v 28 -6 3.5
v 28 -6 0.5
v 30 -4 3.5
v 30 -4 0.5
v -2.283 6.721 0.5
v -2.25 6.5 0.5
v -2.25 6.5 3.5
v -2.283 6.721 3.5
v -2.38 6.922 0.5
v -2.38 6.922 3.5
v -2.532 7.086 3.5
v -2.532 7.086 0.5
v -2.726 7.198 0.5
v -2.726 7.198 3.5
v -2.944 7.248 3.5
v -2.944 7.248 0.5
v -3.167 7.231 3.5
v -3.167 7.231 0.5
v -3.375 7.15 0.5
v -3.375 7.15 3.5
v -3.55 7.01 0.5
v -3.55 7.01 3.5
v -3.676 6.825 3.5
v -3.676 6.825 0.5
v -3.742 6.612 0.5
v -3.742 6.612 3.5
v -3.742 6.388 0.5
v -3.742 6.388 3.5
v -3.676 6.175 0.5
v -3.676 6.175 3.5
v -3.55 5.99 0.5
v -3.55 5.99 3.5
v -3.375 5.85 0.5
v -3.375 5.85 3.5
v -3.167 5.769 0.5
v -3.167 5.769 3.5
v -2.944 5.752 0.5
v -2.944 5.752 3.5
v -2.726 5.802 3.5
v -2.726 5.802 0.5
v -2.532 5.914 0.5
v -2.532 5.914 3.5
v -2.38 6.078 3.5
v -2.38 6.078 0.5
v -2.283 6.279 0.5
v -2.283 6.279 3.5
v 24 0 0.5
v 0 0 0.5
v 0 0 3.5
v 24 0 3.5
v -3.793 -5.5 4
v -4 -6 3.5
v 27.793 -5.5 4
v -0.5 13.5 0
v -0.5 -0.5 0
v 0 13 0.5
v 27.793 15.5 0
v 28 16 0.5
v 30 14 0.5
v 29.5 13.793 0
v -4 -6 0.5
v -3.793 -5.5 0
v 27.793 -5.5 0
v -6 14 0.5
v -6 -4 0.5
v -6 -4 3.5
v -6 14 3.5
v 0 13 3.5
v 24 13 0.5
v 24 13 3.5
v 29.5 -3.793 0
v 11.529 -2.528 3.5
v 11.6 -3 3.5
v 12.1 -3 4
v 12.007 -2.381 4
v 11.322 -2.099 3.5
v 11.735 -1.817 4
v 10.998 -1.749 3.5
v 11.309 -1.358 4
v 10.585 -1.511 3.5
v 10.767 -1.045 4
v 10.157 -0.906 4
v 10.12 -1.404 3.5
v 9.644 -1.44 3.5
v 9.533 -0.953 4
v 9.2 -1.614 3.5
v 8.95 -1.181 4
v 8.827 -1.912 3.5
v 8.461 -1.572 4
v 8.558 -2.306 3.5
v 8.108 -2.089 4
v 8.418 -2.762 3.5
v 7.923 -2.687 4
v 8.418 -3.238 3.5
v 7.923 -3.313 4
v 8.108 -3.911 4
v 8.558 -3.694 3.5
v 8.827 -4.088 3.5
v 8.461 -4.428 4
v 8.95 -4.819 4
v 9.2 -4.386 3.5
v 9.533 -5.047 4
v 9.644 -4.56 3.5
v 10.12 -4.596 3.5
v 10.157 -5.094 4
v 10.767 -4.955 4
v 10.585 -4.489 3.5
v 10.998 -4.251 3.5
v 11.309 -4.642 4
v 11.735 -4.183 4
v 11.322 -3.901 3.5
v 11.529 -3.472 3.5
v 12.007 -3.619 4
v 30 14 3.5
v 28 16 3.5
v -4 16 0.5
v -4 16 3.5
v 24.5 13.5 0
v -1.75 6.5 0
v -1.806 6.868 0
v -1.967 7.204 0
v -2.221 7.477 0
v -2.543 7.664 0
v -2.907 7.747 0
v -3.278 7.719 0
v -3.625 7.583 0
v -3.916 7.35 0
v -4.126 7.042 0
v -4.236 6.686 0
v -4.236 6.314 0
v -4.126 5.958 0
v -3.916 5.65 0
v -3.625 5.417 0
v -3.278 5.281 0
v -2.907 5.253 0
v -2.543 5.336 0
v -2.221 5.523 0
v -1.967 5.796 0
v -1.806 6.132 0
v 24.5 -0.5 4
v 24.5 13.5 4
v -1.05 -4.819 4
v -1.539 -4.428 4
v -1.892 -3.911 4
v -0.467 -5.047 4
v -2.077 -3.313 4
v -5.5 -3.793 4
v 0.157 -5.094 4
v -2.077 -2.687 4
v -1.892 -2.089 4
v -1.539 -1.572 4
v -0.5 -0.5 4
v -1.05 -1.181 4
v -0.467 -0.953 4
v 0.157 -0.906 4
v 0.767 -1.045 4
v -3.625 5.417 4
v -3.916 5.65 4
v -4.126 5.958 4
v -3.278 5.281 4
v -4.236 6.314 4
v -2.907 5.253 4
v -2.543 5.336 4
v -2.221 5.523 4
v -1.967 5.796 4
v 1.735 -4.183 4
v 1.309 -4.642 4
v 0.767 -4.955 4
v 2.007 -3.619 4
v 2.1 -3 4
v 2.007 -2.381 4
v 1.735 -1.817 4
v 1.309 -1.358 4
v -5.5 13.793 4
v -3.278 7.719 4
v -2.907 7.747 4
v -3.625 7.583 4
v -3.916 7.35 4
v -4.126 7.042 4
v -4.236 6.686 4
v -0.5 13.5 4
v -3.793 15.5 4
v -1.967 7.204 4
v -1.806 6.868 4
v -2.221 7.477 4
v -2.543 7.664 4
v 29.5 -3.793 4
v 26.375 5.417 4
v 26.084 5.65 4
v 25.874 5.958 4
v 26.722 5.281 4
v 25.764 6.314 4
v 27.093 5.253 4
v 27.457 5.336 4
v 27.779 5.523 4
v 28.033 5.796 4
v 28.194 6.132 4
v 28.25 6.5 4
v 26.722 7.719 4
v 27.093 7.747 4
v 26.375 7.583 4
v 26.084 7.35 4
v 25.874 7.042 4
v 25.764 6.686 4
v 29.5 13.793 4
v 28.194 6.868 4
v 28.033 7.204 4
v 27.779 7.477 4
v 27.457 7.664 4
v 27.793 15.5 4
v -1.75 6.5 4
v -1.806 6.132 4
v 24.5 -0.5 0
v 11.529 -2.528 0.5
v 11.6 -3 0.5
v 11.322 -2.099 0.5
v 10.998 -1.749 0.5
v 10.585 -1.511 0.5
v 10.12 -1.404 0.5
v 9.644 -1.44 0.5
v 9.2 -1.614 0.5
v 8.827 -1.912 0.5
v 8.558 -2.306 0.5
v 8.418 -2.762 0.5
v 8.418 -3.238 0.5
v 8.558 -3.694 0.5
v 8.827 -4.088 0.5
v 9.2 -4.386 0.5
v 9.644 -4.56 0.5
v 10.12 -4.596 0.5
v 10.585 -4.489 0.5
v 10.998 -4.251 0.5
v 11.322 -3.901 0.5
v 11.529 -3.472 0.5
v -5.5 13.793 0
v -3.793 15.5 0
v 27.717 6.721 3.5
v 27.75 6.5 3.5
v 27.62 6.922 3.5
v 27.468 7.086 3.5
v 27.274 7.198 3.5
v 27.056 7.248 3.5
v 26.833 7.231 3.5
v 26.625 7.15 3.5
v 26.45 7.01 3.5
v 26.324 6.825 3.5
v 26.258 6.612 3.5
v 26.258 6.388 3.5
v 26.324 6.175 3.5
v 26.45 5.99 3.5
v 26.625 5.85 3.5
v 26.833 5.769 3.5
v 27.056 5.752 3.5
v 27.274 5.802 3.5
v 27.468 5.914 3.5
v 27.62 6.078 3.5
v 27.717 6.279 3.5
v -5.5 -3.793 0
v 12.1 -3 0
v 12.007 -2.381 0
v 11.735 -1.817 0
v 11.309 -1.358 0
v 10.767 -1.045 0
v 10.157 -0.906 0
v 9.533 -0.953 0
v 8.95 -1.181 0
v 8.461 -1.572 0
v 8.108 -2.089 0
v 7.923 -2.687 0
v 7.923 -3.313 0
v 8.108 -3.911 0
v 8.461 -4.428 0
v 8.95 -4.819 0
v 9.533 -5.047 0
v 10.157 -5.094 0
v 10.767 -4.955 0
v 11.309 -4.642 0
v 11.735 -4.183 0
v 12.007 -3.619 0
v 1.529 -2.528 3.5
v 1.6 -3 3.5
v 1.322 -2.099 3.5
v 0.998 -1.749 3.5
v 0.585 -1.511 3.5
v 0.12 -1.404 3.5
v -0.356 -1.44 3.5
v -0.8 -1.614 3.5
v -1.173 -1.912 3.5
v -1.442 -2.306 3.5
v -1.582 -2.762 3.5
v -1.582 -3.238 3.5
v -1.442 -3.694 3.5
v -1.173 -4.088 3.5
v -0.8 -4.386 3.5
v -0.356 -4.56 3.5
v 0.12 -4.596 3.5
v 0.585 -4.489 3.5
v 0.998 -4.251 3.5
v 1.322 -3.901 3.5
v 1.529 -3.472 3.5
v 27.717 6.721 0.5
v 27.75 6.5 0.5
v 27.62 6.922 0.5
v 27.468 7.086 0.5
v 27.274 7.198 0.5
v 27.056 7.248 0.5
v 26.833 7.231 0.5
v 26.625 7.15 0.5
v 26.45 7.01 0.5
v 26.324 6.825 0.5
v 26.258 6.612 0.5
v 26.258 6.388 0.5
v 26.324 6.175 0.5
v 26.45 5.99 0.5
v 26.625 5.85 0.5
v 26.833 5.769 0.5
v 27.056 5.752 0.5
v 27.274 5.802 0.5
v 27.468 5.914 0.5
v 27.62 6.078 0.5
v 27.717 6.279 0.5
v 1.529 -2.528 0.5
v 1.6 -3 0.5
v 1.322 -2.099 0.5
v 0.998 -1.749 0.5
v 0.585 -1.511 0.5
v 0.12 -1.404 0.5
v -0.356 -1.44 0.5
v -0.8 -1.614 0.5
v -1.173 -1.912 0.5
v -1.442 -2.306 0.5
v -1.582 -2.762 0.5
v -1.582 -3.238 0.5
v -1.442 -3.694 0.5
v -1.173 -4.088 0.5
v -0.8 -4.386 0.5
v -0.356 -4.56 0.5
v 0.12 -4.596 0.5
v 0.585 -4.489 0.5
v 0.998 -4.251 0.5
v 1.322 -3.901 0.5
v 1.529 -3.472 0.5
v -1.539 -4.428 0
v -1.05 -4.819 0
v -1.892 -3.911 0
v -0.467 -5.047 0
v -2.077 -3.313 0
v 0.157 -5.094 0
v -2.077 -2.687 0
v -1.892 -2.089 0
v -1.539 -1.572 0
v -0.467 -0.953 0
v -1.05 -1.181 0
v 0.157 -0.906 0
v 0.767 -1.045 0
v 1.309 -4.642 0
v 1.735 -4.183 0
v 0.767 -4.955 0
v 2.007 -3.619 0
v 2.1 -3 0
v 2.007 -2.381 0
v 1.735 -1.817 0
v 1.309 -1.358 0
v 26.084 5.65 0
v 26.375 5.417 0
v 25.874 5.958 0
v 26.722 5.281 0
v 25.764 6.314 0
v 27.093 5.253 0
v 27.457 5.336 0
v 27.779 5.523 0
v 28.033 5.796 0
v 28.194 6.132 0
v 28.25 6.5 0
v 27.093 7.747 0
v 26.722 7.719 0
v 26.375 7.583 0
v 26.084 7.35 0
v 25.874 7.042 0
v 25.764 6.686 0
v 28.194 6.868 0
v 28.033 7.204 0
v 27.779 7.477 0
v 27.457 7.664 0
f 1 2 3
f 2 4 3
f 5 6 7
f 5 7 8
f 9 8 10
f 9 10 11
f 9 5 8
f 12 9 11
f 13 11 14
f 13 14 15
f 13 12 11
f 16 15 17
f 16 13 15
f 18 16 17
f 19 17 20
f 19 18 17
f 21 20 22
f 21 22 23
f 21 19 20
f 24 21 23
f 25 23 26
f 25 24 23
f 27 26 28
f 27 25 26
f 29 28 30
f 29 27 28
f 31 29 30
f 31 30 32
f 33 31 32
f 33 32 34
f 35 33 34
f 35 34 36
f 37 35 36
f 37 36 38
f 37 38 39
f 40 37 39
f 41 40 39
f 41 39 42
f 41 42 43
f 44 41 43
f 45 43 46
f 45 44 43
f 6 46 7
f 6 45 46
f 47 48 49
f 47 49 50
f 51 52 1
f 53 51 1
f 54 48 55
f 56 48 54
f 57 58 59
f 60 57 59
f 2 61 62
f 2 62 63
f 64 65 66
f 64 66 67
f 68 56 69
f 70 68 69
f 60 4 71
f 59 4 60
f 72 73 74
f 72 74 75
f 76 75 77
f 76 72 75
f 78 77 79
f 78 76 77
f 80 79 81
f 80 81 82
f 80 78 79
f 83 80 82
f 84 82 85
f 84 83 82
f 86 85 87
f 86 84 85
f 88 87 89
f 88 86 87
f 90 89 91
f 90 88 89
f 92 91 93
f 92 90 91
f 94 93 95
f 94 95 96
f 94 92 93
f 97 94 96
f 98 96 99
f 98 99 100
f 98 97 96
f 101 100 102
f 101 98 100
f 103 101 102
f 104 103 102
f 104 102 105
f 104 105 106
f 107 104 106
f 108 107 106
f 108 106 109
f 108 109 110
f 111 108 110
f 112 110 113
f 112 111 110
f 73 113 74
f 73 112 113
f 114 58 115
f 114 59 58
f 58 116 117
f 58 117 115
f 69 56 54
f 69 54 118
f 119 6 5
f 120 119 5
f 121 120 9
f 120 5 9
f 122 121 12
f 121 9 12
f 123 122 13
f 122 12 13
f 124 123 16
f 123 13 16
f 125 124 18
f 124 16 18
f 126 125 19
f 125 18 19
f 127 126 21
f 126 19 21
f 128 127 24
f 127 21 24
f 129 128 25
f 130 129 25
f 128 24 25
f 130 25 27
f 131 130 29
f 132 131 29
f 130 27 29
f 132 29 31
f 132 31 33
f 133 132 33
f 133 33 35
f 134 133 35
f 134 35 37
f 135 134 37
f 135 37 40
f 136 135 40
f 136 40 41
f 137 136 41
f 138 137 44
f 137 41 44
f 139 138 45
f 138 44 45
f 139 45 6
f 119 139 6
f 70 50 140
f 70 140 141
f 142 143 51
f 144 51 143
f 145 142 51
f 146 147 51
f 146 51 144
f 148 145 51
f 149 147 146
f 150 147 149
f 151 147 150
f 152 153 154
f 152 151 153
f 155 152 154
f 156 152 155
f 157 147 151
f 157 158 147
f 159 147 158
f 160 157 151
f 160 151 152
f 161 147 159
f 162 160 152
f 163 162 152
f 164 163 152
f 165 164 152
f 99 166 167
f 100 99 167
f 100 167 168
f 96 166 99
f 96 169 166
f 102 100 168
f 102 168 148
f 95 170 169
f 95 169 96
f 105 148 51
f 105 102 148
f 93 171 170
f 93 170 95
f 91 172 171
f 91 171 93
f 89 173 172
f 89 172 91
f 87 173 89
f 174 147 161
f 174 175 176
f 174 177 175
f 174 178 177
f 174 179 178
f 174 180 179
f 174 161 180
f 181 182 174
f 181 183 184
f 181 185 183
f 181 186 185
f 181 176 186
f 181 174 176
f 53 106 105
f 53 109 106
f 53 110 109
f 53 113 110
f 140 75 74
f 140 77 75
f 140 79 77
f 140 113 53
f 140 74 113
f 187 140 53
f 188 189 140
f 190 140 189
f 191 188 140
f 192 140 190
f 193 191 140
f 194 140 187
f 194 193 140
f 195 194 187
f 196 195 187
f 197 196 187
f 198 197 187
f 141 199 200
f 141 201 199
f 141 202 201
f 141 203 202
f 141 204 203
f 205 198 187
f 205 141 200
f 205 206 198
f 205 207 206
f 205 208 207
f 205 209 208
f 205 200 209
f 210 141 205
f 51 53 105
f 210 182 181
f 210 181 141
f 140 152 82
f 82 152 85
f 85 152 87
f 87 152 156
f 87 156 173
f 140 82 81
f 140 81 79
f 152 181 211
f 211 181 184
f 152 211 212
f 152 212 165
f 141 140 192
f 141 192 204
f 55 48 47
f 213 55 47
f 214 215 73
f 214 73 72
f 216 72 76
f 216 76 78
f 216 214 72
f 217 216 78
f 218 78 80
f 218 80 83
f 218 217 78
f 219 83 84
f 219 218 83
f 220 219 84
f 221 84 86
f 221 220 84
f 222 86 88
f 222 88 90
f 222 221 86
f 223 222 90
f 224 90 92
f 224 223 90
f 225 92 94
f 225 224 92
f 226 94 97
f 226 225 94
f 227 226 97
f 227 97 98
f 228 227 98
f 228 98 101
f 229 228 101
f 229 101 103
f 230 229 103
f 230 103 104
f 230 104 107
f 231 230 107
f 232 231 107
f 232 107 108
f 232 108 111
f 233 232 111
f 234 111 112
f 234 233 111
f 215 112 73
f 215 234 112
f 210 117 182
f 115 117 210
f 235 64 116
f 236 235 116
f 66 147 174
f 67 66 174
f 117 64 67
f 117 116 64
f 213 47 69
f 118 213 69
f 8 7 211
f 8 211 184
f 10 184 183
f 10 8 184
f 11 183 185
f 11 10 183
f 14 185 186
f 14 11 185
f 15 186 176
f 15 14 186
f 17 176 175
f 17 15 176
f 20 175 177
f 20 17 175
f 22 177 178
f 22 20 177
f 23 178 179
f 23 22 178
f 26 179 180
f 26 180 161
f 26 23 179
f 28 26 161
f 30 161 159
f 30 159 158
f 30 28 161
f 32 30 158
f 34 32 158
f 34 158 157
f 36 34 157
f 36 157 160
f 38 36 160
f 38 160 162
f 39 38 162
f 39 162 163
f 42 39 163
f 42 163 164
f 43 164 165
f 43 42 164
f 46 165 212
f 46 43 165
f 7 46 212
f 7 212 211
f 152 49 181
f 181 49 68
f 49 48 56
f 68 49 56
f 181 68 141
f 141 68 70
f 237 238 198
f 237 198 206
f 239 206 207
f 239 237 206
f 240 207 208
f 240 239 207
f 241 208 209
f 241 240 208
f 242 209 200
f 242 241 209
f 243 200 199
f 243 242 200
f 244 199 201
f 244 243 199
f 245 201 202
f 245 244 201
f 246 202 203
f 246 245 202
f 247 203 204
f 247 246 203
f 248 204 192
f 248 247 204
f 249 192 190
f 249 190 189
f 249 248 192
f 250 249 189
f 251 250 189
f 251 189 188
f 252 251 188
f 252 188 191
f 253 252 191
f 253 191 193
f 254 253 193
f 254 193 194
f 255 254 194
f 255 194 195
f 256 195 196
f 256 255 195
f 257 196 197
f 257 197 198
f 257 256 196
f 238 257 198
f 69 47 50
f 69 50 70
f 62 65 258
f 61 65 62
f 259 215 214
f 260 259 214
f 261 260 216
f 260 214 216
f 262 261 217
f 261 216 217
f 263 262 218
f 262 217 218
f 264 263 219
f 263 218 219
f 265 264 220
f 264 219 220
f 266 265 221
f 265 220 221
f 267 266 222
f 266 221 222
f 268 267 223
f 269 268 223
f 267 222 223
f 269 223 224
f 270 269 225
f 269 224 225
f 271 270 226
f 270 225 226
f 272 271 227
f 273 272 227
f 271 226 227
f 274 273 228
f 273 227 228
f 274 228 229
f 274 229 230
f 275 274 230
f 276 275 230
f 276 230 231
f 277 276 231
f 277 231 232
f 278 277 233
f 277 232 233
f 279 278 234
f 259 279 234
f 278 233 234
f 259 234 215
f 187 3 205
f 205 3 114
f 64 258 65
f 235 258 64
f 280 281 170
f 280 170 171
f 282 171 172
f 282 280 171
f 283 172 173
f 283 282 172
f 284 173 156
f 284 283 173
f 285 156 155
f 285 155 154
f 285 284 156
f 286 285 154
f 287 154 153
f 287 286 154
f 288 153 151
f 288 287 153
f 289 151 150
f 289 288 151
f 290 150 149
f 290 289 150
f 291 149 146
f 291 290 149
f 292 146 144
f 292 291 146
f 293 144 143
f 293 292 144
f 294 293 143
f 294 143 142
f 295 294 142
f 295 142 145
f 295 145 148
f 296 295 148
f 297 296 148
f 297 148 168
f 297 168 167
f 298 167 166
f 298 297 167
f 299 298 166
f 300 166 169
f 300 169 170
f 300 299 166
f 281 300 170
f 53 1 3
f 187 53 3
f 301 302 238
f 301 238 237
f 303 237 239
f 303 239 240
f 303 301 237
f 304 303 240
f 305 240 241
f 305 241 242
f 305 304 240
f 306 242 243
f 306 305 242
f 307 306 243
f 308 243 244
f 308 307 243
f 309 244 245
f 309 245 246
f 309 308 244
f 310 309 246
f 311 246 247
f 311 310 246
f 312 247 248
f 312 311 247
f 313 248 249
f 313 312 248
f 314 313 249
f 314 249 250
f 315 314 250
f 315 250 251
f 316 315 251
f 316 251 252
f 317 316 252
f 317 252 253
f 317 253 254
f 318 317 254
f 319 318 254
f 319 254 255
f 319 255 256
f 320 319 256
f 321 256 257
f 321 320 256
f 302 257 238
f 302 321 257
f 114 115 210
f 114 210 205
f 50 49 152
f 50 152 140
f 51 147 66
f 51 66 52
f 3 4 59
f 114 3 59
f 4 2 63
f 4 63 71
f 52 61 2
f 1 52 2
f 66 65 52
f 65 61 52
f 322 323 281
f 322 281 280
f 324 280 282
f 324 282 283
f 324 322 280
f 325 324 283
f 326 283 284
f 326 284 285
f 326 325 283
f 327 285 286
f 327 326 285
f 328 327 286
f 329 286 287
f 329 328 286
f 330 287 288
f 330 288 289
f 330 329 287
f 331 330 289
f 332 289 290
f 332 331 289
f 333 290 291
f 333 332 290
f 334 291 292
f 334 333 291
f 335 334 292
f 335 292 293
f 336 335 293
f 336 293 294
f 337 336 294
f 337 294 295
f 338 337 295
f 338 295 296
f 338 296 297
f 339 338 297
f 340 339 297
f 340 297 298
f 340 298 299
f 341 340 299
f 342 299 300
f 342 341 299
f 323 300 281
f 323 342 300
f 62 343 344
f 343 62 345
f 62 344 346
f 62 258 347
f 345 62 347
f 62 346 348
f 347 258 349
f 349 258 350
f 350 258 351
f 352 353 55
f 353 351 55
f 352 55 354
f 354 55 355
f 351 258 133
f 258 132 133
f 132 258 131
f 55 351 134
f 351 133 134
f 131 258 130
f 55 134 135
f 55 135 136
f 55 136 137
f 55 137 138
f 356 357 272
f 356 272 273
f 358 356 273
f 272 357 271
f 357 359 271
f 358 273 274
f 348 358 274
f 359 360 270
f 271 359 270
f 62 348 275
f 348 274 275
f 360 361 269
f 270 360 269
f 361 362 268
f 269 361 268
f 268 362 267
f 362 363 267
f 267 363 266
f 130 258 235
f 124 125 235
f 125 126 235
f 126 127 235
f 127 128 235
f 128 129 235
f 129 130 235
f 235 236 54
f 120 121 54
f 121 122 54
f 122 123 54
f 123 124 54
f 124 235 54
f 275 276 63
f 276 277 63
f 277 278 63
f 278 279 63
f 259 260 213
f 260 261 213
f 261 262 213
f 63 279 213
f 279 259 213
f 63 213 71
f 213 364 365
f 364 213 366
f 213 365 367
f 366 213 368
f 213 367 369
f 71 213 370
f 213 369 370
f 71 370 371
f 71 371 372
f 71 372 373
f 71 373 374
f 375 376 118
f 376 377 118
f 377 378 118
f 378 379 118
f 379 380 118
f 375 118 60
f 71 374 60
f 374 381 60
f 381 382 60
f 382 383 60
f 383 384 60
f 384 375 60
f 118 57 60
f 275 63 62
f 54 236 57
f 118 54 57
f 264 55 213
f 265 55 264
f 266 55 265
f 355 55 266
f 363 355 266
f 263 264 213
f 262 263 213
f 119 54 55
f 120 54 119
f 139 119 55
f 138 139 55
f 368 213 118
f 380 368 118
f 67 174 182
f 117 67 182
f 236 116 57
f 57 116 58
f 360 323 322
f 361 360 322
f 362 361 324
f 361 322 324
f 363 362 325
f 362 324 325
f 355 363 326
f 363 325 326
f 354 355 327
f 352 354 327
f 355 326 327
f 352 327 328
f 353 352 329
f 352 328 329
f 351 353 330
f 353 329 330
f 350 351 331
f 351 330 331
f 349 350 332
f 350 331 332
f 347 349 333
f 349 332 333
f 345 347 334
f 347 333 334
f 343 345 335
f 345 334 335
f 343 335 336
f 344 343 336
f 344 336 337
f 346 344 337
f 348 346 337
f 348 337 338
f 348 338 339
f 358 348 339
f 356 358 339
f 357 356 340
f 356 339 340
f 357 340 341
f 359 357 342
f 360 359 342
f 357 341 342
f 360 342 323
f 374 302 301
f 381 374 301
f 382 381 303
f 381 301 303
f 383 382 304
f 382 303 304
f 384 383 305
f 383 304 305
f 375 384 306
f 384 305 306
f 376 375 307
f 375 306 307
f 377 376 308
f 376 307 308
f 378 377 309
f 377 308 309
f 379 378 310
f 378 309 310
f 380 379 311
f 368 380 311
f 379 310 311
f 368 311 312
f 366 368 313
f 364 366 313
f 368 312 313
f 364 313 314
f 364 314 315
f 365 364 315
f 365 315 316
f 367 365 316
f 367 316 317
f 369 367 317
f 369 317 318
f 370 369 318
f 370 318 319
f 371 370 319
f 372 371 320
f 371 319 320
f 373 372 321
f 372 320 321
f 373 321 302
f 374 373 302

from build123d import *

# Parameters (mm, degrees)
F0_W     = 36
F0_H     = 22
F0_R     = 1.6
F0_R_2   = 0.75
F0_W_2   = 24
F0_H_2   = 13
F1_DEPTH = 4
F2_SIZE  = 2
F3_SIZE  = 0.5


with BuildPart() as f1:
    # F0 (on Top) → F1 (new body)
    with BuildSketch(Plane.XY):
        with Locations((12, 5)):
            Rectangle(F0_W, F0_H)
        with Locations((0, -3)):
            Circle(F0_R, mode=Mode.SUBTRACT)
        with Locations((10, -3)):
            Circle(F0_R, mode=Mode.SUBTRACT)
        with Locations((-3, 6.5)):
            Circle(F0_R_2, mode=Mode.SUBTRACT)
        with Locations((12, 6.5)):
            Rectangle(F0_W_2, F0_H_2, mode=Mode.SUBTRACT)
        with Locations((27, 6.5)):
            Circle(F0_R_2, mode=Mode.SUBTRACT)
    extrude(amount=F1_DEPTH)

    # F2
    f2_edges = [f1.edges().sort_by_distance(p)[0] for p in [
        (-6, -6, 2),
        (30, -6, 2),
        (30, 16, 2),
        (-6, 16, 2),
    ]]
    chamfer(f2_edges, length=F2_SIZE)

    # F3
    f3_edges = [f1.edges().sort_by_distance(p)[0] for p in [
        (-6, 5, 0),
        (-5, 15, 0),
        (-5, -5, 0),
        (12, 16, 0),
        (12, -6, 0),
        (29, 15, 0),
        (29, -5, 0),
        (30, 5, 0),
        (-1.6, -3, 0),
        (8.4, -3, 0),
        (-3.75, 6.5, 0),
        (12, 0, 0),
        (0, 6.5, 0),
        (12, 13, 0),
        (24, 6.5, 0),
        (26.25, 6.5, 0),
        (-6, 5, 4),
        (-5, 15, 4),
        (-5, -5, 4),
        (12, 16, 4),
        (12, -6, 4),
        (29, 15, 4),
        (29, -5, 4),
        (30, 5, 4),
        (-1.6, -3, 4),
        (8.4, -3, 4),
        (-3.75, 6.5, 4),
        (12, 0, 4),
        (0, 6.5, 4),
        (12, 13, 4),
        (24, 6.5, 4),
        (26.25, 6.5, 4),
    ]]
    chamfer(f3_edges, length=F3_SIZE)


solid = f1.part
